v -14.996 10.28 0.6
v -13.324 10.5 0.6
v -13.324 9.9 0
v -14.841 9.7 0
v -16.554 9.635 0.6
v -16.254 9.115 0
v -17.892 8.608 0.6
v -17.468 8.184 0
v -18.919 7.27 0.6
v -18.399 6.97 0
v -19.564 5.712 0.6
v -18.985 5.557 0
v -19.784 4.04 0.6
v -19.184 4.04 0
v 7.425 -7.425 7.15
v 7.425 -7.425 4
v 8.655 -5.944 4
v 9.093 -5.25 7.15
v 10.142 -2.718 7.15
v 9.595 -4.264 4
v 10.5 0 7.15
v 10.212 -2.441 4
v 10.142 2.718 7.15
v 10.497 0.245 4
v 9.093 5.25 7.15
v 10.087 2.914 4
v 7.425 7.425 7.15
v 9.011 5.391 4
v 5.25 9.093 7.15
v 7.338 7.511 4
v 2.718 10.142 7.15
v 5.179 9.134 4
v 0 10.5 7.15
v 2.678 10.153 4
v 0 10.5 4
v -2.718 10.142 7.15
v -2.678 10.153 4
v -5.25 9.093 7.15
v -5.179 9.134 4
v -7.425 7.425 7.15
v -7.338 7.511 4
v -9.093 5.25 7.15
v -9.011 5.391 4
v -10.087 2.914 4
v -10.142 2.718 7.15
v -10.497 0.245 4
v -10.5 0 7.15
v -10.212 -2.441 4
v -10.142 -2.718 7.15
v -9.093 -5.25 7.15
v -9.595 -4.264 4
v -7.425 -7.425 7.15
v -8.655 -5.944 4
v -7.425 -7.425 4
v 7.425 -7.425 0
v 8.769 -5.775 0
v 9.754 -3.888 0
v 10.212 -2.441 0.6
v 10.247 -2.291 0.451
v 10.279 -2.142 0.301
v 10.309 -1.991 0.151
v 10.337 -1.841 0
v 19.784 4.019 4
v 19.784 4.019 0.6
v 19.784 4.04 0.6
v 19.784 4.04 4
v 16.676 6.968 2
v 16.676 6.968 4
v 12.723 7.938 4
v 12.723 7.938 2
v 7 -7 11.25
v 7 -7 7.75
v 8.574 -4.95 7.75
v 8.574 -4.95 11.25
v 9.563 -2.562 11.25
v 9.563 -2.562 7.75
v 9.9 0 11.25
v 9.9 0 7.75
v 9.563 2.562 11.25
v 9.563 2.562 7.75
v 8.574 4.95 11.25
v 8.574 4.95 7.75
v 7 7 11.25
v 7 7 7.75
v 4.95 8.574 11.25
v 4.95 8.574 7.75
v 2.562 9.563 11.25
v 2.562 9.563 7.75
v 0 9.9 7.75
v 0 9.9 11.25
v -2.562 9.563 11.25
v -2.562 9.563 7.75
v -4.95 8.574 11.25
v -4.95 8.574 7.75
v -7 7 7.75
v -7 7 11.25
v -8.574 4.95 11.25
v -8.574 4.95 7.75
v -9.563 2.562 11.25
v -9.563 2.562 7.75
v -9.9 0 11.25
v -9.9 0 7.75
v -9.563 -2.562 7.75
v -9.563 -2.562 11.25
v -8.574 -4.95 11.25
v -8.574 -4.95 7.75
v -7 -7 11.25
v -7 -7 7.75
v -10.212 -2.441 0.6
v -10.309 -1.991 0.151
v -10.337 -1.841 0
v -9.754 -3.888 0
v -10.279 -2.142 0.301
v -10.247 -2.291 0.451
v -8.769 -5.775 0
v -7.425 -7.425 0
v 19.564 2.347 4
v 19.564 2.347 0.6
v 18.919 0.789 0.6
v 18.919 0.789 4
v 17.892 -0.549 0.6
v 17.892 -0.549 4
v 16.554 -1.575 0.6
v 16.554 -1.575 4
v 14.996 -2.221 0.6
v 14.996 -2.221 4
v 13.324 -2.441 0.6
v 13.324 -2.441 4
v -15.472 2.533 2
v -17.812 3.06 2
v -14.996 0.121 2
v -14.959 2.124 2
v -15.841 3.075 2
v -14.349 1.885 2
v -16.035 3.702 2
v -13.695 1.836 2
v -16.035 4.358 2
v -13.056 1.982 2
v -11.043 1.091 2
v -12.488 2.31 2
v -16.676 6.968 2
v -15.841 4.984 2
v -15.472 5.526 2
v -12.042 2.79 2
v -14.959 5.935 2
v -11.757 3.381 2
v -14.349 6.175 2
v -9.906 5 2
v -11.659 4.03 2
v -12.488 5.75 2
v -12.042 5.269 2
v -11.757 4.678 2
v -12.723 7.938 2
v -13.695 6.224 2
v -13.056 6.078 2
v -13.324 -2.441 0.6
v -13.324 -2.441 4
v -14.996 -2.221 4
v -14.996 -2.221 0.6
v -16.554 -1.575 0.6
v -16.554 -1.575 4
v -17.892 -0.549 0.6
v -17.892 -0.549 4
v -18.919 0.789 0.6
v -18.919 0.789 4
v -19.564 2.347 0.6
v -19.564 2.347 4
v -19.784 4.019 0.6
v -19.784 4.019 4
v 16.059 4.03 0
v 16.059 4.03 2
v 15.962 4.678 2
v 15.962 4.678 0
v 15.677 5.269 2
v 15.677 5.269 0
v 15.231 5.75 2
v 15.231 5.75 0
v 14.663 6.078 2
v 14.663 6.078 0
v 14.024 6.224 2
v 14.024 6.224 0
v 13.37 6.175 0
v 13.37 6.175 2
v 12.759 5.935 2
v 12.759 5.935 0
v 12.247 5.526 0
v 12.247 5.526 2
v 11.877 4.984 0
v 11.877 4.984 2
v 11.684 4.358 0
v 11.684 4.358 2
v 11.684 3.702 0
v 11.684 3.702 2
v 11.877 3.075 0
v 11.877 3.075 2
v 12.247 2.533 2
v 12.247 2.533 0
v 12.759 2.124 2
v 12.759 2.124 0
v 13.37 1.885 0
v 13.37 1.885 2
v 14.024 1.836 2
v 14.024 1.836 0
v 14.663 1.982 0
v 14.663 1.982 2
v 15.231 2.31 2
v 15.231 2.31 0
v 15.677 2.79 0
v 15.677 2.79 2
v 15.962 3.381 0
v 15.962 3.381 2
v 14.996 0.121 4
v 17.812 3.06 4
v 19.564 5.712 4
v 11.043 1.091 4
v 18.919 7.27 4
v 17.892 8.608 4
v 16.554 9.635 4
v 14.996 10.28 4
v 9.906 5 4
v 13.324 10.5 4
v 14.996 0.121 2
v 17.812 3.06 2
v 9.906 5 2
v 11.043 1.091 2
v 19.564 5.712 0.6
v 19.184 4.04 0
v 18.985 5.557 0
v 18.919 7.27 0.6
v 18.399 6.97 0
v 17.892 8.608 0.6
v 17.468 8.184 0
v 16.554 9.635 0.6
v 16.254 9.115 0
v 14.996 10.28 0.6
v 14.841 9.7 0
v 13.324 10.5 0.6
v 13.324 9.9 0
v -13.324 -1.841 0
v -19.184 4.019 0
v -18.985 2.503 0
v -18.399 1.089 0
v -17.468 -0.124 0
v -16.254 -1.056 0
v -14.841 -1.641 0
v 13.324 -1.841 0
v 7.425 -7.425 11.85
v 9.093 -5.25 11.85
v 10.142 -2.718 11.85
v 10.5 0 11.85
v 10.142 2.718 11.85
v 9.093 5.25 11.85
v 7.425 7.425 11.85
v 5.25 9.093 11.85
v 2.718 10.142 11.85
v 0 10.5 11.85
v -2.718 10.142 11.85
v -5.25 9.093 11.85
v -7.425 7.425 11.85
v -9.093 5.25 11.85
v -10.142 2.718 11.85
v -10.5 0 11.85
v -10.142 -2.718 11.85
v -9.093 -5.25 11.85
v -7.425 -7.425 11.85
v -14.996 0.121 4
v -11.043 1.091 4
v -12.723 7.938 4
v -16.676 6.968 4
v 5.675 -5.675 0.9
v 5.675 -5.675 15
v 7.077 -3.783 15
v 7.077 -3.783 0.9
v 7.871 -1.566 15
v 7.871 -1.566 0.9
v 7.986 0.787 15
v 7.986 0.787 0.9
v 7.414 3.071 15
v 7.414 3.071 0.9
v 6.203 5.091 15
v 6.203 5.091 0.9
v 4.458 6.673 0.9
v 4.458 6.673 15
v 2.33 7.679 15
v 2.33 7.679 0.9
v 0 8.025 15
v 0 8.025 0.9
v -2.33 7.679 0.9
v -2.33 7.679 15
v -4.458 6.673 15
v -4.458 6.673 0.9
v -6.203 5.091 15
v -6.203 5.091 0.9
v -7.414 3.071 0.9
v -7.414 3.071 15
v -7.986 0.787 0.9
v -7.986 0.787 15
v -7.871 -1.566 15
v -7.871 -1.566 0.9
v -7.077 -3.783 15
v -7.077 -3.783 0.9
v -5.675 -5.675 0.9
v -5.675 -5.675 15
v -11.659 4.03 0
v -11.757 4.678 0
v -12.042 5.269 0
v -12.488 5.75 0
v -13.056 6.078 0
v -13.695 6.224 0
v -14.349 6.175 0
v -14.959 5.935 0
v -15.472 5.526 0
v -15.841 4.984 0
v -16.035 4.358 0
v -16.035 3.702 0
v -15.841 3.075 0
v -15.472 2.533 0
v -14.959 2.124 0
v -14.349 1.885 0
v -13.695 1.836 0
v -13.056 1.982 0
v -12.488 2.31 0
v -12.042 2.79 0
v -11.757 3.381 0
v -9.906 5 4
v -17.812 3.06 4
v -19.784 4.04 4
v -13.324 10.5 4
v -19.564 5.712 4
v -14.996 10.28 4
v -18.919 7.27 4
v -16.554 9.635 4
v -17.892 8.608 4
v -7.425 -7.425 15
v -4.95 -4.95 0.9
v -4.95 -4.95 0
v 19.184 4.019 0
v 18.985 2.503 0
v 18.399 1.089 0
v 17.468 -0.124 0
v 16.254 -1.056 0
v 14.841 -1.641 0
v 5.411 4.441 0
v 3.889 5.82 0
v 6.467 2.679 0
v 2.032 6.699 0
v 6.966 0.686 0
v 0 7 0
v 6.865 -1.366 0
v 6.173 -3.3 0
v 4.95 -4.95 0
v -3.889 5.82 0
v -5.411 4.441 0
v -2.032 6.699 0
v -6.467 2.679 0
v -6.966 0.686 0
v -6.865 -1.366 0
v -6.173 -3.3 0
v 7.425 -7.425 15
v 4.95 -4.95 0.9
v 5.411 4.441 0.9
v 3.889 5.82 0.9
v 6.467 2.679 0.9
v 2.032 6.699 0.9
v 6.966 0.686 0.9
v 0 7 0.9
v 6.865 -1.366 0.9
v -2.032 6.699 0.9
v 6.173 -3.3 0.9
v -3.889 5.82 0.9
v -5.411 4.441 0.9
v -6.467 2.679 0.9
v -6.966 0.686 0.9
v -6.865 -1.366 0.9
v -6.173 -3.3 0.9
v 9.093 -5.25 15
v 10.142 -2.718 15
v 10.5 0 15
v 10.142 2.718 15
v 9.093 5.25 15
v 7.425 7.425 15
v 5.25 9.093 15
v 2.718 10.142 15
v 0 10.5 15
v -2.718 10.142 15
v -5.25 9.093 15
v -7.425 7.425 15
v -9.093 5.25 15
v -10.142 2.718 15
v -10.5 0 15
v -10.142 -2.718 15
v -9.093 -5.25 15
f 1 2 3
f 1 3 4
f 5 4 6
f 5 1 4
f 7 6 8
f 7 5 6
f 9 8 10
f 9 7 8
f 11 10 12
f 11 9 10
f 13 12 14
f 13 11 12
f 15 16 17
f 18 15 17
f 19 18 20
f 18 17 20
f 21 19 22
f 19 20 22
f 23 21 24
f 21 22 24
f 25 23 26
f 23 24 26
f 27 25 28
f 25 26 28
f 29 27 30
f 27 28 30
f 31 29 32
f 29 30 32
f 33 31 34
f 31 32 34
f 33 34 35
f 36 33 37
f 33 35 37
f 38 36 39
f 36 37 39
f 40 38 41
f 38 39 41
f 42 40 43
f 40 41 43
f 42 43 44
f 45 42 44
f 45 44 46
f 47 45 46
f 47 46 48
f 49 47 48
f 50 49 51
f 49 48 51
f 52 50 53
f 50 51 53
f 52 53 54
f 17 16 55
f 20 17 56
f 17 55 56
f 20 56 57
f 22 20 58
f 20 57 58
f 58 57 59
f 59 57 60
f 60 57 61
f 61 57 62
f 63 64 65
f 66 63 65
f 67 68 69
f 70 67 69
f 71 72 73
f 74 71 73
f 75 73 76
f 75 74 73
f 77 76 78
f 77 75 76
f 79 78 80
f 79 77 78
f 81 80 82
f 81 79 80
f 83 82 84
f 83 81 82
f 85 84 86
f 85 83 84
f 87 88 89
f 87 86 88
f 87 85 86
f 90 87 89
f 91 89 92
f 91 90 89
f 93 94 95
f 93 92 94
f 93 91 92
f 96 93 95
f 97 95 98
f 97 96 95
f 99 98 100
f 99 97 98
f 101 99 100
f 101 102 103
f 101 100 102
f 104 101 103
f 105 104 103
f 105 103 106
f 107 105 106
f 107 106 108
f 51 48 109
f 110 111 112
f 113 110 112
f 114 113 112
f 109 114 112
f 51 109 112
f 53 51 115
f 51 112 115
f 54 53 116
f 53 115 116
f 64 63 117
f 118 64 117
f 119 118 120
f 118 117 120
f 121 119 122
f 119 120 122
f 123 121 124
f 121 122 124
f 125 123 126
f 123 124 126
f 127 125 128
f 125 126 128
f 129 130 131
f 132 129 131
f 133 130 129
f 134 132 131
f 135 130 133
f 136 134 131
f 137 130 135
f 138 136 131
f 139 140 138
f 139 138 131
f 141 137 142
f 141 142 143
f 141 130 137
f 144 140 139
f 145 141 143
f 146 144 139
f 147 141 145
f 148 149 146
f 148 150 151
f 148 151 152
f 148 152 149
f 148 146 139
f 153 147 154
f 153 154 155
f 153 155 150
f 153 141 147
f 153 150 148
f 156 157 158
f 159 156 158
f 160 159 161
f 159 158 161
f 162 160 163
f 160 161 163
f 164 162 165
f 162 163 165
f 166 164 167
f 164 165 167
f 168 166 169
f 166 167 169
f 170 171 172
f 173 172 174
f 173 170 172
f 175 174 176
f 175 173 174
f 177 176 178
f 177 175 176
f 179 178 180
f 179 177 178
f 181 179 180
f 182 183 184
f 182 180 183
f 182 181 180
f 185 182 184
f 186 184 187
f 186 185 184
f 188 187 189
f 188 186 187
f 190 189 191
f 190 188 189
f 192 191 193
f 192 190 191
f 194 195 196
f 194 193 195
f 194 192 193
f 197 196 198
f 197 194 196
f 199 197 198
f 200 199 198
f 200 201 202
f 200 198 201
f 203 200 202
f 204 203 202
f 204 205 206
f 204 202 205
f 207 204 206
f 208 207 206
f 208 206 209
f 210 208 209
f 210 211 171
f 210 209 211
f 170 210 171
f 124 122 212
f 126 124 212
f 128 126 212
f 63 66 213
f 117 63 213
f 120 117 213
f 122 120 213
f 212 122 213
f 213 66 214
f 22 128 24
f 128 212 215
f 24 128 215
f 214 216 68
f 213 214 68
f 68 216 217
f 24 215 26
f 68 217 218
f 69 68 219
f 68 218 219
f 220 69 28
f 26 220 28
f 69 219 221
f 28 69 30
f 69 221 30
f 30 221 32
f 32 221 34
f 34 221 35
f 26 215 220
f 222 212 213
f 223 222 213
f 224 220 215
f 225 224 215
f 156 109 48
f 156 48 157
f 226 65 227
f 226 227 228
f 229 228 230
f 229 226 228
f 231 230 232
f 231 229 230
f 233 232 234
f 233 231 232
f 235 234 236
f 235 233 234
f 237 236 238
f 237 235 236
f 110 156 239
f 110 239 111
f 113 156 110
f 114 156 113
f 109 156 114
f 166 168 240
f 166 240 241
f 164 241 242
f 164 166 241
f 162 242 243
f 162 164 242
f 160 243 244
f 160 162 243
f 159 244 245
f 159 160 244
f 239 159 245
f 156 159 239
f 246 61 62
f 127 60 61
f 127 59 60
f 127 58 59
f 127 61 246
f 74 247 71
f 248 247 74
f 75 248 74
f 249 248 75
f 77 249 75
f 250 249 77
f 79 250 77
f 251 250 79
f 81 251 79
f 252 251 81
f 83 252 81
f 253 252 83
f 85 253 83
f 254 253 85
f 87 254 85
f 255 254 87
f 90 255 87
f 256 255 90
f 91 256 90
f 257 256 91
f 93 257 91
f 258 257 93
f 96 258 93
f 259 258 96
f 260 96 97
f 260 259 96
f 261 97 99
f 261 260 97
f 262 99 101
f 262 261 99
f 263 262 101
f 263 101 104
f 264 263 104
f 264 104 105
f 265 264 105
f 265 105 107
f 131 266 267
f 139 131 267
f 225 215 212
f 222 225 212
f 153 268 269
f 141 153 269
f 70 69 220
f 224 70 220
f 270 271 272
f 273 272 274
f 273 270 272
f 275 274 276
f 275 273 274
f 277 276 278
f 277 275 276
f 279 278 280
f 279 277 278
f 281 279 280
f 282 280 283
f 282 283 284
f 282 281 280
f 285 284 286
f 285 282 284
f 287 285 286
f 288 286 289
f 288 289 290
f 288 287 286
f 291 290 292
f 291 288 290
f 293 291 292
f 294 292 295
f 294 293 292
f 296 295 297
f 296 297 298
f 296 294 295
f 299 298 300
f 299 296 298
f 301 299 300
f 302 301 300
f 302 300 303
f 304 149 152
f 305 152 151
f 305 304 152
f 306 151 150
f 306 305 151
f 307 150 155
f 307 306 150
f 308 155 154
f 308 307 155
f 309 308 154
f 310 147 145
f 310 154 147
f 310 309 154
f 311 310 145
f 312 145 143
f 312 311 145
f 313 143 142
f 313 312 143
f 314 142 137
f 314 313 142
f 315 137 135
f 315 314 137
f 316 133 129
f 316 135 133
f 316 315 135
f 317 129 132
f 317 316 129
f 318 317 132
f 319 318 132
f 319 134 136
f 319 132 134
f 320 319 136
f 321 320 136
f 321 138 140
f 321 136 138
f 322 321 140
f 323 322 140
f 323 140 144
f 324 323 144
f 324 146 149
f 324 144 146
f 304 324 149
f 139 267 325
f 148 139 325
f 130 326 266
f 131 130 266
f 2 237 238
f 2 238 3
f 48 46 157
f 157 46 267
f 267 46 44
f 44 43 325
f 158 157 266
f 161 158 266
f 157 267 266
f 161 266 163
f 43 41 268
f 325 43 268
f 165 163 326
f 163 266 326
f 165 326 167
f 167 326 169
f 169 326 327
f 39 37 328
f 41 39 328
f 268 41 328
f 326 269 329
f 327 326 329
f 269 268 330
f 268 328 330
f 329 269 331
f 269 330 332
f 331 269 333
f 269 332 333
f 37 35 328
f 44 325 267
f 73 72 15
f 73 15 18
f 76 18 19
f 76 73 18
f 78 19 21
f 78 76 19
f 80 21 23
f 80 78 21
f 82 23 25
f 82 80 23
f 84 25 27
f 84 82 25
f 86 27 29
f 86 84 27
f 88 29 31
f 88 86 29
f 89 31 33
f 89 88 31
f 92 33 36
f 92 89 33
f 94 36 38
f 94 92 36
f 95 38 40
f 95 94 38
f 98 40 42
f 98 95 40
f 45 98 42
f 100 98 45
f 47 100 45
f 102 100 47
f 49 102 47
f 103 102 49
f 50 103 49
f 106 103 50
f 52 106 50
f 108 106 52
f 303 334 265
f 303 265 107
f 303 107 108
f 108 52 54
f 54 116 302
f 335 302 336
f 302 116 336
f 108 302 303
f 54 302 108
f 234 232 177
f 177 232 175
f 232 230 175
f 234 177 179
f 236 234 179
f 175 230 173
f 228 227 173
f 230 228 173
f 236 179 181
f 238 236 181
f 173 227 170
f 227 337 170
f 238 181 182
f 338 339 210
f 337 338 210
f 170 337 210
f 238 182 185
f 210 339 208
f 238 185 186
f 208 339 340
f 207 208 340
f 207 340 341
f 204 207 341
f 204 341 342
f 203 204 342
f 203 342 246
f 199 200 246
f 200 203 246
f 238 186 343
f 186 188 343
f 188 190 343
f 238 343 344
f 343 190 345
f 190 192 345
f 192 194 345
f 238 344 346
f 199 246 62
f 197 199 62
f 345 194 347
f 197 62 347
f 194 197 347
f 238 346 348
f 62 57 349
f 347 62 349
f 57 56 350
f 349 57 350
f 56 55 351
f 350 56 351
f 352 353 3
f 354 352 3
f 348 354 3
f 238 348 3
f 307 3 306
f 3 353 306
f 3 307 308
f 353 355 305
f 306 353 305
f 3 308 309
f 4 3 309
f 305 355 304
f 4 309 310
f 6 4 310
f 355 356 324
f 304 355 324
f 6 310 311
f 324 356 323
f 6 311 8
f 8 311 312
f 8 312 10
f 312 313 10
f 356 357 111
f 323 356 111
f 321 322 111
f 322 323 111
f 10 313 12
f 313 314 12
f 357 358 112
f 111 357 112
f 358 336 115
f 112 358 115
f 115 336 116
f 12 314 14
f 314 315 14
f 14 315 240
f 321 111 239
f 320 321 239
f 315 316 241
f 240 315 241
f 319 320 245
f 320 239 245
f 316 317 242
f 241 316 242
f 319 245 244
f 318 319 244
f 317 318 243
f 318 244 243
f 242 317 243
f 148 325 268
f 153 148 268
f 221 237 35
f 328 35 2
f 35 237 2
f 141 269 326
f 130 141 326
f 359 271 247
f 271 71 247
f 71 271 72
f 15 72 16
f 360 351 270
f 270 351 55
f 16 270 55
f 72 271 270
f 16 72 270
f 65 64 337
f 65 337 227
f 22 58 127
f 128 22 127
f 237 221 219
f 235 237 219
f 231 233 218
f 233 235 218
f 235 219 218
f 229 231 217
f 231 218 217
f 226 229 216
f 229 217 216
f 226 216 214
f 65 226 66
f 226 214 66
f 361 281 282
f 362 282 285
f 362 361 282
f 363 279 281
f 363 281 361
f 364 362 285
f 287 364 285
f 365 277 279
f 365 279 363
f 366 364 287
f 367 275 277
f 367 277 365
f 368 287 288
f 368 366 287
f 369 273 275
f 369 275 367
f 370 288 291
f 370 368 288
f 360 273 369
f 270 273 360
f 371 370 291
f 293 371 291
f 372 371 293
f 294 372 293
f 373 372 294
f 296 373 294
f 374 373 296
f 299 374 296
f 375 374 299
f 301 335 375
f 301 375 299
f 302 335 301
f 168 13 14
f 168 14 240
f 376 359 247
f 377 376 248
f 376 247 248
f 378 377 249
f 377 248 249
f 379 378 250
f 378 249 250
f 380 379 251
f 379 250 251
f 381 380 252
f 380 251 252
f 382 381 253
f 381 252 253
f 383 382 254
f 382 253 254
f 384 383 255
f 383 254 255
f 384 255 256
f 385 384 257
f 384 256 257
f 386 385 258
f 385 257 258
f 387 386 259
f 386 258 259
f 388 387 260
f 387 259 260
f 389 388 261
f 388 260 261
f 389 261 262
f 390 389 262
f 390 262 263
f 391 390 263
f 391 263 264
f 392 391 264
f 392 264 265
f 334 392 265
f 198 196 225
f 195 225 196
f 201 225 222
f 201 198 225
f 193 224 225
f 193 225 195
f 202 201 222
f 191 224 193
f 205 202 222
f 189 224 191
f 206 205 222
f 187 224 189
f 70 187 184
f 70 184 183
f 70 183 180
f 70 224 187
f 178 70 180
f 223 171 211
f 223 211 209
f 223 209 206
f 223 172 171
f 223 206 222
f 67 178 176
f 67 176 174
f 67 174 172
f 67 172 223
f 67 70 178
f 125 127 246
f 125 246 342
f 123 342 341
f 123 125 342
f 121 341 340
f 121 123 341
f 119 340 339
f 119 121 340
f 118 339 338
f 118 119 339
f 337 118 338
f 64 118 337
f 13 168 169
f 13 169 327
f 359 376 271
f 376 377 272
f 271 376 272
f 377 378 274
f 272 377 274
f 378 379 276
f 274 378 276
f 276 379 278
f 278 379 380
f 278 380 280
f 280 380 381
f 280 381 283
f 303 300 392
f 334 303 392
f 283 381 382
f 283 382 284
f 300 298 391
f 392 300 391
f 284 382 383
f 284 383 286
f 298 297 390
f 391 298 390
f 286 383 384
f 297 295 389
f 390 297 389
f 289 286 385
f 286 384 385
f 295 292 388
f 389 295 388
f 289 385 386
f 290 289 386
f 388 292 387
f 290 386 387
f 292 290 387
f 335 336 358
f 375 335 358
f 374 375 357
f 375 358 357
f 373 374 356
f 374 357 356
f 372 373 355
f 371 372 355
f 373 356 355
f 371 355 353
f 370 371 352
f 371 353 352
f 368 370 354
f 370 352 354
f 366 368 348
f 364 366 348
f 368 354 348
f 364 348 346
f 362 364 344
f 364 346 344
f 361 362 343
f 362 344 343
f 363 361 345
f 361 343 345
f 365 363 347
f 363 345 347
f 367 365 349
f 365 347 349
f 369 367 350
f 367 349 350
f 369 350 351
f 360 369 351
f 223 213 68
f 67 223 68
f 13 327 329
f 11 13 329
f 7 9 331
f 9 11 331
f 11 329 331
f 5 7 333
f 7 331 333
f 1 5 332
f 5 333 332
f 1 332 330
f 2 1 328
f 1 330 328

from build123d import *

# Parameters (mm, degrees)
SKETCH_R     = 2.2
PAD_DEPTH    = 4
PAD001_DEPTH = 11
POCKET_DEPTH = 2
FILLET_R     = 6.46
CHAMFER_SIZE = 0.6
PAD002_DEPTH = 0.9


with BuildPart() as revolution:
    # Sketch002 → Revolution (revolve)
    with BuildSketch(Plane.XZ):
        Polygon((9.9, 11.25), (10.5, 11.85), (10.5, 7.15), (9.9, 7.75), align=None)
    revolve(axis=Axis((0, 0, 0), (0, 0, 1)))


with BuildPart() as pad002:
    # Sketch → Pad (new body)
    with BuildSketch(Plane.XY):
        with BuildLine():
            Line((-10.212408, -2.440639), (-19.784288, -2.440639))
            Line((-19.784288, -2.440639), (-19.784288, 10.5))
            Line((19.784288, 10.5), (-19.784288, 10.5))
            Line((19.784288, -2.440639), (19.784288, 10.5))
            Line((10.212408, -2.440639), (19.784288, -2.440639))
            ThreePointArc((7.424621, -7.424621), (9.163854, -5.125795), (10.212408, -2.440639))
            Line((5.674532, -5.674532), (7.424621, -7.424621))
            ThreePointArc((5.674532, -5.674532), (0, 8.025), (-5.674532, -5.674532))
            Line((-5.674532, -5.674532), (-7.424621, -7.424621))
            ThreePointArc((-10.212408, -2.440639), (-9.163854, -5.125795), (-7.424621, -7.424621))
        make_face()
        with Locations((13.859288, 4.029681)):
            Circle(SKETCH_R, mode=Mode.SUBTRACT)
        with Locations((-13.859288, 4.029681)):
            Circle(SKETCH_R, mode=Mode.SUBTRACT)
    extrude(amount=PAD_DEPTH)

    # Sketch001 → Pad001 (new body)
    with BuildSketch(Plane.XY.offset(4)):
        with BuildLine():
            ThreePointArc((5.674532, -5.674532), (0, 8.025), (-5.674532, -5.674532))
            Line((-5.674532, -5.674532), (-7.424621, -7.424621))
            ThreePointArc((7.424621, -7.424621), (0, 10.5), (-7.424621, -7.424621))
            Line((5.674532, -5.674532), (7.424621, -7.424621))
        make_face()
    extrude(amount=PAD001_DEPTH)

    # Cut: cut Revolution
    add(revolution.part, mode=Mode.SUBTRACT)

    # Sketch003 → Pocket (cut)
    with BuildSketch(Plane.XY.offset(4)):
        Polygon((17.812321, 3.059611), (16.675909, 6.968072), (12.722877, 7.938142), (9.906256, 4.99975), (11.042667, 1.091289), (14.995699, 0.121219), align=None)
        Polygon((-17.812321, 3.059611), (-14.995699, 0.121219), (-11.042667, 1.091289), (-9.906256, 4.99975), (-12.722877, 7.938142), (-16.675909, 6.968072), align=None)
    extrude(amount=-POCKET_DEPTH, mode=Mode.SUBTRACT)

    # Fillet
    fillet_edges = [pad002.edges().sort_by_distance(p)[0] for p in [
        (19.784288, -2.440639, 2),
        (19.784288, 10.5, 2),
        (-19.784288, 10.5, 2),
        (-19.784288, -2.440639, 2),
    ]]
    fillet(fillet_edges, radius=FILLET_R)

    # Chamfer
    chamfer_edges = [pad002.edges().sort_by_distance(p)[0] for p in [
        (0, 10.5, 0),
        (17.892198, 8.60791, 0),
        (-17.892198, 8.60791, 0),
    ]]
    chamfer(chamfer_edges, length=CHAMFER_SIZE)

    # Sketch004 → Pad002 (new body)
    with BuildSketch(Plane(origin=(0, 0, 0), x_dir=(1, 0, 0), z_dir=(0, 0, -1))):
        with BuildLine():
            ThreePointArc((-4.949747, 4.949747), (0, -7), (4.949747, 4.949747))
            Line((4.949747, 4.949747), (5.674532, 5.674532))
            ThreePointArc((-5.674532, 5.674532), (0, -8.025), (5.674532, 5.674532))
            Line((-5.674532, 5.674532), (-4.949747, 4.949747))
        make_face()
    extrude(amount=-PAD002_DEPTH)


solid = pad002.part
